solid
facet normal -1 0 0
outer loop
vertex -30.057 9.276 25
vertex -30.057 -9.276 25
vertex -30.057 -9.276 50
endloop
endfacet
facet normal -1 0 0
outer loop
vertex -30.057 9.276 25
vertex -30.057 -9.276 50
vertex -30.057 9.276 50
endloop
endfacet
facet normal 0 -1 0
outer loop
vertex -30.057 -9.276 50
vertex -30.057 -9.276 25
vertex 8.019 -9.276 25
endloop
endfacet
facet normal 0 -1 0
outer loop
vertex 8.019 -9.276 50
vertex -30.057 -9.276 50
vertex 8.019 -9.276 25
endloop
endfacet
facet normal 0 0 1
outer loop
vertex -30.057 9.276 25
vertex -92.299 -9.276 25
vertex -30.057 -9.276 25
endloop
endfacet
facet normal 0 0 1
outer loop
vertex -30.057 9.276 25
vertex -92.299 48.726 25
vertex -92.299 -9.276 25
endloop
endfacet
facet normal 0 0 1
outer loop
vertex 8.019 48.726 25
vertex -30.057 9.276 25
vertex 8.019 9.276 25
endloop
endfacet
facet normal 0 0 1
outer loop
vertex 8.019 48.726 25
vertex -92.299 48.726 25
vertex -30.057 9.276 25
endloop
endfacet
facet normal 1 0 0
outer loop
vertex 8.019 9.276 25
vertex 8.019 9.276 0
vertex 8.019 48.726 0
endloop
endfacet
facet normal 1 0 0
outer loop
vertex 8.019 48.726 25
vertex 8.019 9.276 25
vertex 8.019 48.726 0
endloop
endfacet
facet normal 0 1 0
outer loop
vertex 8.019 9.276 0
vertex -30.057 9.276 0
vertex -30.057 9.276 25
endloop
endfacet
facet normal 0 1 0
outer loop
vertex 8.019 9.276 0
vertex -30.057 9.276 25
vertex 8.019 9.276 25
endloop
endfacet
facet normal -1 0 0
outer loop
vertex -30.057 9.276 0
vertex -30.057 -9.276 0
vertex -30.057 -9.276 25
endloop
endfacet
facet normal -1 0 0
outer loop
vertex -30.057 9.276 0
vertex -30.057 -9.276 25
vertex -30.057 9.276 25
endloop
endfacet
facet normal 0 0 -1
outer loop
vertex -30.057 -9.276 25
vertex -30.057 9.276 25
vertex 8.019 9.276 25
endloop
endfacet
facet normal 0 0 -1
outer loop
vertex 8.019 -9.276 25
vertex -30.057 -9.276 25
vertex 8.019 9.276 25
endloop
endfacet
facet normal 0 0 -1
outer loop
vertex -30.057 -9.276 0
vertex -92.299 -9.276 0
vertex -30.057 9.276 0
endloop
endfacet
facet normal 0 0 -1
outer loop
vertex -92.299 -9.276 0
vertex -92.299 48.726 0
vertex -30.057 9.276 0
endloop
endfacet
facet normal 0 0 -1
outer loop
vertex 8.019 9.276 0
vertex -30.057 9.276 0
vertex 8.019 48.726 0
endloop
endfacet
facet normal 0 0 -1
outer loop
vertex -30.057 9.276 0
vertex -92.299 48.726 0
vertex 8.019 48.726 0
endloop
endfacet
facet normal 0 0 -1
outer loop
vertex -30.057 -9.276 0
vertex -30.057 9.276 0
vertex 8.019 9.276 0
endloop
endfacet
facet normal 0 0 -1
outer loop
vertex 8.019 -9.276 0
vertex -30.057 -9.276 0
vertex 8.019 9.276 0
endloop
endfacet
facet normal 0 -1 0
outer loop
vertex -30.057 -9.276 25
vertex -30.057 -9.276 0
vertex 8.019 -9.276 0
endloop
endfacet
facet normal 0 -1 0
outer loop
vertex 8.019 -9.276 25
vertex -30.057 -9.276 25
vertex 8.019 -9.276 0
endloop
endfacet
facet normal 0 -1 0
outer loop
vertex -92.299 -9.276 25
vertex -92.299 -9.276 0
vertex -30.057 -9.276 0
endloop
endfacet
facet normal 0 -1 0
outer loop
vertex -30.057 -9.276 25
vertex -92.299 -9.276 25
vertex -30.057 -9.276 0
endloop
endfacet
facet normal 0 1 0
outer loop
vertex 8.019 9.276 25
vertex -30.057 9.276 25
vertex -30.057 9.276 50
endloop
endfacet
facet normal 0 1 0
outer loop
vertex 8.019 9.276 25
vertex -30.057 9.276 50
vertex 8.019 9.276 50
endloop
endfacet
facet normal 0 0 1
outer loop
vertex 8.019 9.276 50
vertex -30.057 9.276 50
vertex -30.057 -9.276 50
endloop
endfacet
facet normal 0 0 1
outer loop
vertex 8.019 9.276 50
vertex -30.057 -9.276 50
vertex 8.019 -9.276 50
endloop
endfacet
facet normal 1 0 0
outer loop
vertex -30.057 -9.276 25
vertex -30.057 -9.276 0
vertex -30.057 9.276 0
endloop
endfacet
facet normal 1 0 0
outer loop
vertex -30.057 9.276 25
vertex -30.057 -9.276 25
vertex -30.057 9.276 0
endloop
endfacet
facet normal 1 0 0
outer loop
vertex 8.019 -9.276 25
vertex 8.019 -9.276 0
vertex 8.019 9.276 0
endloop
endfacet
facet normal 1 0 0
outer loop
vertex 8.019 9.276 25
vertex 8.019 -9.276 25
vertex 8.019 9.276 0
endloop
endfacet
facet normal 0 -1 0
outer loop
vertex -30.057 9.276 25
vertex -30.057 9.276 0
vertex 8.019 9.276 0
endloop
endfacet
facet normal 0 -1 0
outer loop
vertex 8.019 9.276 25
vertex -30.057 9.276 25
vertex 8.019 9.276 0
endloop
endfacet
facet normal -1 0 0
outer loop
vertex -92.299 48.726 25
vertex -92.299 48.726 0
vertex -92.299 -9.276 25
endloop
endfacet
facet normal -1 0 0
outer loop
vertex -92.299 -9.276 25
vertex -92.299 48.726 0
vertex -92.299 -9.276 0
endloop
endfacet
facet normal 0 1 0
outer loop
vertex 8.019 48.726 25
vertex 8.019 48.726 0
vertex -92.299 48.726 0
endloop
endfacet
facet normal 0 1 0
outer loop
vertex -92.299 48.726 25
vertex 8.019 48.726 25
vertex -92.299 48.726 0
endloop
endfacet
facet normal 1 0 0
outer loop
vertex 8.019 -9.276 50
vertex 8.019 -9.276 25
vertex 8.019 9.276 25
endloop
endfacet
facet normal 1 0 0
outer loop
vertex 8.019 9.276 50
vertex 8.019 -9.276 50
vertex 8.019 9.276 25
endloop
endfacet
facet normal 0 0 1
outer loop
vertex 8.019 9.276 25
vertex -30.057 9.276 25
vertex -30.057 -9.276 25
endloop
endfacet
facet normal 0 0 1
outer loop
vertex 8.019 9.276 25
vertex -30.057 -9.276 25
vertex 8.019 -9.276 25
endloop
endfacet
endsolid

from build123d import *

# Parameters (mm, degrees)
F1_DEPTH  = 25
F0_W      = 38.076185
F0_H      = 18.552418
F2_DEPTH  = 25
F2_FACE_W = 38.076186
F2_FACE_H = 18.552418
F3_DEPTH  = 25


with BuildPart() as f1:
    # F0 (on Top) → F1 (new body)
    with BuildSketch(Plane.XY):
        Polygon((-92.29908, -9.276209), (-30.056716, -9.276209), (-30.056716, 9.276209), (8.019469, 9.276209), (8.019469, 48.726223), (-92.29908, 48.726223), align=None)
    extrude(amount=F1_DEPTH)


with BuildPart() as f2:
    # F0 (on Top) → F2 (new body)
    with BuildSketch(Plane.XY):
        with Locations((-11.018624, 0)):
            Rectangle(F0_W, F0_H)
    extrude(amount=F2_DEPTH)


with BuildPart() as f3:
    # F2_face (on face) → F3 (new body)
    with BuildSketch(Plane(origin=(-11.018624, 0, 25), x_dir=(1, 0, 0), z_dir=(0, 0, 1))):
        Rectangle(F2_FACE_W, F2_FACE_H)
    extrude(amount=F3_DEPTH)


solid = Compound([f1.part, f2.part, f3.part])
